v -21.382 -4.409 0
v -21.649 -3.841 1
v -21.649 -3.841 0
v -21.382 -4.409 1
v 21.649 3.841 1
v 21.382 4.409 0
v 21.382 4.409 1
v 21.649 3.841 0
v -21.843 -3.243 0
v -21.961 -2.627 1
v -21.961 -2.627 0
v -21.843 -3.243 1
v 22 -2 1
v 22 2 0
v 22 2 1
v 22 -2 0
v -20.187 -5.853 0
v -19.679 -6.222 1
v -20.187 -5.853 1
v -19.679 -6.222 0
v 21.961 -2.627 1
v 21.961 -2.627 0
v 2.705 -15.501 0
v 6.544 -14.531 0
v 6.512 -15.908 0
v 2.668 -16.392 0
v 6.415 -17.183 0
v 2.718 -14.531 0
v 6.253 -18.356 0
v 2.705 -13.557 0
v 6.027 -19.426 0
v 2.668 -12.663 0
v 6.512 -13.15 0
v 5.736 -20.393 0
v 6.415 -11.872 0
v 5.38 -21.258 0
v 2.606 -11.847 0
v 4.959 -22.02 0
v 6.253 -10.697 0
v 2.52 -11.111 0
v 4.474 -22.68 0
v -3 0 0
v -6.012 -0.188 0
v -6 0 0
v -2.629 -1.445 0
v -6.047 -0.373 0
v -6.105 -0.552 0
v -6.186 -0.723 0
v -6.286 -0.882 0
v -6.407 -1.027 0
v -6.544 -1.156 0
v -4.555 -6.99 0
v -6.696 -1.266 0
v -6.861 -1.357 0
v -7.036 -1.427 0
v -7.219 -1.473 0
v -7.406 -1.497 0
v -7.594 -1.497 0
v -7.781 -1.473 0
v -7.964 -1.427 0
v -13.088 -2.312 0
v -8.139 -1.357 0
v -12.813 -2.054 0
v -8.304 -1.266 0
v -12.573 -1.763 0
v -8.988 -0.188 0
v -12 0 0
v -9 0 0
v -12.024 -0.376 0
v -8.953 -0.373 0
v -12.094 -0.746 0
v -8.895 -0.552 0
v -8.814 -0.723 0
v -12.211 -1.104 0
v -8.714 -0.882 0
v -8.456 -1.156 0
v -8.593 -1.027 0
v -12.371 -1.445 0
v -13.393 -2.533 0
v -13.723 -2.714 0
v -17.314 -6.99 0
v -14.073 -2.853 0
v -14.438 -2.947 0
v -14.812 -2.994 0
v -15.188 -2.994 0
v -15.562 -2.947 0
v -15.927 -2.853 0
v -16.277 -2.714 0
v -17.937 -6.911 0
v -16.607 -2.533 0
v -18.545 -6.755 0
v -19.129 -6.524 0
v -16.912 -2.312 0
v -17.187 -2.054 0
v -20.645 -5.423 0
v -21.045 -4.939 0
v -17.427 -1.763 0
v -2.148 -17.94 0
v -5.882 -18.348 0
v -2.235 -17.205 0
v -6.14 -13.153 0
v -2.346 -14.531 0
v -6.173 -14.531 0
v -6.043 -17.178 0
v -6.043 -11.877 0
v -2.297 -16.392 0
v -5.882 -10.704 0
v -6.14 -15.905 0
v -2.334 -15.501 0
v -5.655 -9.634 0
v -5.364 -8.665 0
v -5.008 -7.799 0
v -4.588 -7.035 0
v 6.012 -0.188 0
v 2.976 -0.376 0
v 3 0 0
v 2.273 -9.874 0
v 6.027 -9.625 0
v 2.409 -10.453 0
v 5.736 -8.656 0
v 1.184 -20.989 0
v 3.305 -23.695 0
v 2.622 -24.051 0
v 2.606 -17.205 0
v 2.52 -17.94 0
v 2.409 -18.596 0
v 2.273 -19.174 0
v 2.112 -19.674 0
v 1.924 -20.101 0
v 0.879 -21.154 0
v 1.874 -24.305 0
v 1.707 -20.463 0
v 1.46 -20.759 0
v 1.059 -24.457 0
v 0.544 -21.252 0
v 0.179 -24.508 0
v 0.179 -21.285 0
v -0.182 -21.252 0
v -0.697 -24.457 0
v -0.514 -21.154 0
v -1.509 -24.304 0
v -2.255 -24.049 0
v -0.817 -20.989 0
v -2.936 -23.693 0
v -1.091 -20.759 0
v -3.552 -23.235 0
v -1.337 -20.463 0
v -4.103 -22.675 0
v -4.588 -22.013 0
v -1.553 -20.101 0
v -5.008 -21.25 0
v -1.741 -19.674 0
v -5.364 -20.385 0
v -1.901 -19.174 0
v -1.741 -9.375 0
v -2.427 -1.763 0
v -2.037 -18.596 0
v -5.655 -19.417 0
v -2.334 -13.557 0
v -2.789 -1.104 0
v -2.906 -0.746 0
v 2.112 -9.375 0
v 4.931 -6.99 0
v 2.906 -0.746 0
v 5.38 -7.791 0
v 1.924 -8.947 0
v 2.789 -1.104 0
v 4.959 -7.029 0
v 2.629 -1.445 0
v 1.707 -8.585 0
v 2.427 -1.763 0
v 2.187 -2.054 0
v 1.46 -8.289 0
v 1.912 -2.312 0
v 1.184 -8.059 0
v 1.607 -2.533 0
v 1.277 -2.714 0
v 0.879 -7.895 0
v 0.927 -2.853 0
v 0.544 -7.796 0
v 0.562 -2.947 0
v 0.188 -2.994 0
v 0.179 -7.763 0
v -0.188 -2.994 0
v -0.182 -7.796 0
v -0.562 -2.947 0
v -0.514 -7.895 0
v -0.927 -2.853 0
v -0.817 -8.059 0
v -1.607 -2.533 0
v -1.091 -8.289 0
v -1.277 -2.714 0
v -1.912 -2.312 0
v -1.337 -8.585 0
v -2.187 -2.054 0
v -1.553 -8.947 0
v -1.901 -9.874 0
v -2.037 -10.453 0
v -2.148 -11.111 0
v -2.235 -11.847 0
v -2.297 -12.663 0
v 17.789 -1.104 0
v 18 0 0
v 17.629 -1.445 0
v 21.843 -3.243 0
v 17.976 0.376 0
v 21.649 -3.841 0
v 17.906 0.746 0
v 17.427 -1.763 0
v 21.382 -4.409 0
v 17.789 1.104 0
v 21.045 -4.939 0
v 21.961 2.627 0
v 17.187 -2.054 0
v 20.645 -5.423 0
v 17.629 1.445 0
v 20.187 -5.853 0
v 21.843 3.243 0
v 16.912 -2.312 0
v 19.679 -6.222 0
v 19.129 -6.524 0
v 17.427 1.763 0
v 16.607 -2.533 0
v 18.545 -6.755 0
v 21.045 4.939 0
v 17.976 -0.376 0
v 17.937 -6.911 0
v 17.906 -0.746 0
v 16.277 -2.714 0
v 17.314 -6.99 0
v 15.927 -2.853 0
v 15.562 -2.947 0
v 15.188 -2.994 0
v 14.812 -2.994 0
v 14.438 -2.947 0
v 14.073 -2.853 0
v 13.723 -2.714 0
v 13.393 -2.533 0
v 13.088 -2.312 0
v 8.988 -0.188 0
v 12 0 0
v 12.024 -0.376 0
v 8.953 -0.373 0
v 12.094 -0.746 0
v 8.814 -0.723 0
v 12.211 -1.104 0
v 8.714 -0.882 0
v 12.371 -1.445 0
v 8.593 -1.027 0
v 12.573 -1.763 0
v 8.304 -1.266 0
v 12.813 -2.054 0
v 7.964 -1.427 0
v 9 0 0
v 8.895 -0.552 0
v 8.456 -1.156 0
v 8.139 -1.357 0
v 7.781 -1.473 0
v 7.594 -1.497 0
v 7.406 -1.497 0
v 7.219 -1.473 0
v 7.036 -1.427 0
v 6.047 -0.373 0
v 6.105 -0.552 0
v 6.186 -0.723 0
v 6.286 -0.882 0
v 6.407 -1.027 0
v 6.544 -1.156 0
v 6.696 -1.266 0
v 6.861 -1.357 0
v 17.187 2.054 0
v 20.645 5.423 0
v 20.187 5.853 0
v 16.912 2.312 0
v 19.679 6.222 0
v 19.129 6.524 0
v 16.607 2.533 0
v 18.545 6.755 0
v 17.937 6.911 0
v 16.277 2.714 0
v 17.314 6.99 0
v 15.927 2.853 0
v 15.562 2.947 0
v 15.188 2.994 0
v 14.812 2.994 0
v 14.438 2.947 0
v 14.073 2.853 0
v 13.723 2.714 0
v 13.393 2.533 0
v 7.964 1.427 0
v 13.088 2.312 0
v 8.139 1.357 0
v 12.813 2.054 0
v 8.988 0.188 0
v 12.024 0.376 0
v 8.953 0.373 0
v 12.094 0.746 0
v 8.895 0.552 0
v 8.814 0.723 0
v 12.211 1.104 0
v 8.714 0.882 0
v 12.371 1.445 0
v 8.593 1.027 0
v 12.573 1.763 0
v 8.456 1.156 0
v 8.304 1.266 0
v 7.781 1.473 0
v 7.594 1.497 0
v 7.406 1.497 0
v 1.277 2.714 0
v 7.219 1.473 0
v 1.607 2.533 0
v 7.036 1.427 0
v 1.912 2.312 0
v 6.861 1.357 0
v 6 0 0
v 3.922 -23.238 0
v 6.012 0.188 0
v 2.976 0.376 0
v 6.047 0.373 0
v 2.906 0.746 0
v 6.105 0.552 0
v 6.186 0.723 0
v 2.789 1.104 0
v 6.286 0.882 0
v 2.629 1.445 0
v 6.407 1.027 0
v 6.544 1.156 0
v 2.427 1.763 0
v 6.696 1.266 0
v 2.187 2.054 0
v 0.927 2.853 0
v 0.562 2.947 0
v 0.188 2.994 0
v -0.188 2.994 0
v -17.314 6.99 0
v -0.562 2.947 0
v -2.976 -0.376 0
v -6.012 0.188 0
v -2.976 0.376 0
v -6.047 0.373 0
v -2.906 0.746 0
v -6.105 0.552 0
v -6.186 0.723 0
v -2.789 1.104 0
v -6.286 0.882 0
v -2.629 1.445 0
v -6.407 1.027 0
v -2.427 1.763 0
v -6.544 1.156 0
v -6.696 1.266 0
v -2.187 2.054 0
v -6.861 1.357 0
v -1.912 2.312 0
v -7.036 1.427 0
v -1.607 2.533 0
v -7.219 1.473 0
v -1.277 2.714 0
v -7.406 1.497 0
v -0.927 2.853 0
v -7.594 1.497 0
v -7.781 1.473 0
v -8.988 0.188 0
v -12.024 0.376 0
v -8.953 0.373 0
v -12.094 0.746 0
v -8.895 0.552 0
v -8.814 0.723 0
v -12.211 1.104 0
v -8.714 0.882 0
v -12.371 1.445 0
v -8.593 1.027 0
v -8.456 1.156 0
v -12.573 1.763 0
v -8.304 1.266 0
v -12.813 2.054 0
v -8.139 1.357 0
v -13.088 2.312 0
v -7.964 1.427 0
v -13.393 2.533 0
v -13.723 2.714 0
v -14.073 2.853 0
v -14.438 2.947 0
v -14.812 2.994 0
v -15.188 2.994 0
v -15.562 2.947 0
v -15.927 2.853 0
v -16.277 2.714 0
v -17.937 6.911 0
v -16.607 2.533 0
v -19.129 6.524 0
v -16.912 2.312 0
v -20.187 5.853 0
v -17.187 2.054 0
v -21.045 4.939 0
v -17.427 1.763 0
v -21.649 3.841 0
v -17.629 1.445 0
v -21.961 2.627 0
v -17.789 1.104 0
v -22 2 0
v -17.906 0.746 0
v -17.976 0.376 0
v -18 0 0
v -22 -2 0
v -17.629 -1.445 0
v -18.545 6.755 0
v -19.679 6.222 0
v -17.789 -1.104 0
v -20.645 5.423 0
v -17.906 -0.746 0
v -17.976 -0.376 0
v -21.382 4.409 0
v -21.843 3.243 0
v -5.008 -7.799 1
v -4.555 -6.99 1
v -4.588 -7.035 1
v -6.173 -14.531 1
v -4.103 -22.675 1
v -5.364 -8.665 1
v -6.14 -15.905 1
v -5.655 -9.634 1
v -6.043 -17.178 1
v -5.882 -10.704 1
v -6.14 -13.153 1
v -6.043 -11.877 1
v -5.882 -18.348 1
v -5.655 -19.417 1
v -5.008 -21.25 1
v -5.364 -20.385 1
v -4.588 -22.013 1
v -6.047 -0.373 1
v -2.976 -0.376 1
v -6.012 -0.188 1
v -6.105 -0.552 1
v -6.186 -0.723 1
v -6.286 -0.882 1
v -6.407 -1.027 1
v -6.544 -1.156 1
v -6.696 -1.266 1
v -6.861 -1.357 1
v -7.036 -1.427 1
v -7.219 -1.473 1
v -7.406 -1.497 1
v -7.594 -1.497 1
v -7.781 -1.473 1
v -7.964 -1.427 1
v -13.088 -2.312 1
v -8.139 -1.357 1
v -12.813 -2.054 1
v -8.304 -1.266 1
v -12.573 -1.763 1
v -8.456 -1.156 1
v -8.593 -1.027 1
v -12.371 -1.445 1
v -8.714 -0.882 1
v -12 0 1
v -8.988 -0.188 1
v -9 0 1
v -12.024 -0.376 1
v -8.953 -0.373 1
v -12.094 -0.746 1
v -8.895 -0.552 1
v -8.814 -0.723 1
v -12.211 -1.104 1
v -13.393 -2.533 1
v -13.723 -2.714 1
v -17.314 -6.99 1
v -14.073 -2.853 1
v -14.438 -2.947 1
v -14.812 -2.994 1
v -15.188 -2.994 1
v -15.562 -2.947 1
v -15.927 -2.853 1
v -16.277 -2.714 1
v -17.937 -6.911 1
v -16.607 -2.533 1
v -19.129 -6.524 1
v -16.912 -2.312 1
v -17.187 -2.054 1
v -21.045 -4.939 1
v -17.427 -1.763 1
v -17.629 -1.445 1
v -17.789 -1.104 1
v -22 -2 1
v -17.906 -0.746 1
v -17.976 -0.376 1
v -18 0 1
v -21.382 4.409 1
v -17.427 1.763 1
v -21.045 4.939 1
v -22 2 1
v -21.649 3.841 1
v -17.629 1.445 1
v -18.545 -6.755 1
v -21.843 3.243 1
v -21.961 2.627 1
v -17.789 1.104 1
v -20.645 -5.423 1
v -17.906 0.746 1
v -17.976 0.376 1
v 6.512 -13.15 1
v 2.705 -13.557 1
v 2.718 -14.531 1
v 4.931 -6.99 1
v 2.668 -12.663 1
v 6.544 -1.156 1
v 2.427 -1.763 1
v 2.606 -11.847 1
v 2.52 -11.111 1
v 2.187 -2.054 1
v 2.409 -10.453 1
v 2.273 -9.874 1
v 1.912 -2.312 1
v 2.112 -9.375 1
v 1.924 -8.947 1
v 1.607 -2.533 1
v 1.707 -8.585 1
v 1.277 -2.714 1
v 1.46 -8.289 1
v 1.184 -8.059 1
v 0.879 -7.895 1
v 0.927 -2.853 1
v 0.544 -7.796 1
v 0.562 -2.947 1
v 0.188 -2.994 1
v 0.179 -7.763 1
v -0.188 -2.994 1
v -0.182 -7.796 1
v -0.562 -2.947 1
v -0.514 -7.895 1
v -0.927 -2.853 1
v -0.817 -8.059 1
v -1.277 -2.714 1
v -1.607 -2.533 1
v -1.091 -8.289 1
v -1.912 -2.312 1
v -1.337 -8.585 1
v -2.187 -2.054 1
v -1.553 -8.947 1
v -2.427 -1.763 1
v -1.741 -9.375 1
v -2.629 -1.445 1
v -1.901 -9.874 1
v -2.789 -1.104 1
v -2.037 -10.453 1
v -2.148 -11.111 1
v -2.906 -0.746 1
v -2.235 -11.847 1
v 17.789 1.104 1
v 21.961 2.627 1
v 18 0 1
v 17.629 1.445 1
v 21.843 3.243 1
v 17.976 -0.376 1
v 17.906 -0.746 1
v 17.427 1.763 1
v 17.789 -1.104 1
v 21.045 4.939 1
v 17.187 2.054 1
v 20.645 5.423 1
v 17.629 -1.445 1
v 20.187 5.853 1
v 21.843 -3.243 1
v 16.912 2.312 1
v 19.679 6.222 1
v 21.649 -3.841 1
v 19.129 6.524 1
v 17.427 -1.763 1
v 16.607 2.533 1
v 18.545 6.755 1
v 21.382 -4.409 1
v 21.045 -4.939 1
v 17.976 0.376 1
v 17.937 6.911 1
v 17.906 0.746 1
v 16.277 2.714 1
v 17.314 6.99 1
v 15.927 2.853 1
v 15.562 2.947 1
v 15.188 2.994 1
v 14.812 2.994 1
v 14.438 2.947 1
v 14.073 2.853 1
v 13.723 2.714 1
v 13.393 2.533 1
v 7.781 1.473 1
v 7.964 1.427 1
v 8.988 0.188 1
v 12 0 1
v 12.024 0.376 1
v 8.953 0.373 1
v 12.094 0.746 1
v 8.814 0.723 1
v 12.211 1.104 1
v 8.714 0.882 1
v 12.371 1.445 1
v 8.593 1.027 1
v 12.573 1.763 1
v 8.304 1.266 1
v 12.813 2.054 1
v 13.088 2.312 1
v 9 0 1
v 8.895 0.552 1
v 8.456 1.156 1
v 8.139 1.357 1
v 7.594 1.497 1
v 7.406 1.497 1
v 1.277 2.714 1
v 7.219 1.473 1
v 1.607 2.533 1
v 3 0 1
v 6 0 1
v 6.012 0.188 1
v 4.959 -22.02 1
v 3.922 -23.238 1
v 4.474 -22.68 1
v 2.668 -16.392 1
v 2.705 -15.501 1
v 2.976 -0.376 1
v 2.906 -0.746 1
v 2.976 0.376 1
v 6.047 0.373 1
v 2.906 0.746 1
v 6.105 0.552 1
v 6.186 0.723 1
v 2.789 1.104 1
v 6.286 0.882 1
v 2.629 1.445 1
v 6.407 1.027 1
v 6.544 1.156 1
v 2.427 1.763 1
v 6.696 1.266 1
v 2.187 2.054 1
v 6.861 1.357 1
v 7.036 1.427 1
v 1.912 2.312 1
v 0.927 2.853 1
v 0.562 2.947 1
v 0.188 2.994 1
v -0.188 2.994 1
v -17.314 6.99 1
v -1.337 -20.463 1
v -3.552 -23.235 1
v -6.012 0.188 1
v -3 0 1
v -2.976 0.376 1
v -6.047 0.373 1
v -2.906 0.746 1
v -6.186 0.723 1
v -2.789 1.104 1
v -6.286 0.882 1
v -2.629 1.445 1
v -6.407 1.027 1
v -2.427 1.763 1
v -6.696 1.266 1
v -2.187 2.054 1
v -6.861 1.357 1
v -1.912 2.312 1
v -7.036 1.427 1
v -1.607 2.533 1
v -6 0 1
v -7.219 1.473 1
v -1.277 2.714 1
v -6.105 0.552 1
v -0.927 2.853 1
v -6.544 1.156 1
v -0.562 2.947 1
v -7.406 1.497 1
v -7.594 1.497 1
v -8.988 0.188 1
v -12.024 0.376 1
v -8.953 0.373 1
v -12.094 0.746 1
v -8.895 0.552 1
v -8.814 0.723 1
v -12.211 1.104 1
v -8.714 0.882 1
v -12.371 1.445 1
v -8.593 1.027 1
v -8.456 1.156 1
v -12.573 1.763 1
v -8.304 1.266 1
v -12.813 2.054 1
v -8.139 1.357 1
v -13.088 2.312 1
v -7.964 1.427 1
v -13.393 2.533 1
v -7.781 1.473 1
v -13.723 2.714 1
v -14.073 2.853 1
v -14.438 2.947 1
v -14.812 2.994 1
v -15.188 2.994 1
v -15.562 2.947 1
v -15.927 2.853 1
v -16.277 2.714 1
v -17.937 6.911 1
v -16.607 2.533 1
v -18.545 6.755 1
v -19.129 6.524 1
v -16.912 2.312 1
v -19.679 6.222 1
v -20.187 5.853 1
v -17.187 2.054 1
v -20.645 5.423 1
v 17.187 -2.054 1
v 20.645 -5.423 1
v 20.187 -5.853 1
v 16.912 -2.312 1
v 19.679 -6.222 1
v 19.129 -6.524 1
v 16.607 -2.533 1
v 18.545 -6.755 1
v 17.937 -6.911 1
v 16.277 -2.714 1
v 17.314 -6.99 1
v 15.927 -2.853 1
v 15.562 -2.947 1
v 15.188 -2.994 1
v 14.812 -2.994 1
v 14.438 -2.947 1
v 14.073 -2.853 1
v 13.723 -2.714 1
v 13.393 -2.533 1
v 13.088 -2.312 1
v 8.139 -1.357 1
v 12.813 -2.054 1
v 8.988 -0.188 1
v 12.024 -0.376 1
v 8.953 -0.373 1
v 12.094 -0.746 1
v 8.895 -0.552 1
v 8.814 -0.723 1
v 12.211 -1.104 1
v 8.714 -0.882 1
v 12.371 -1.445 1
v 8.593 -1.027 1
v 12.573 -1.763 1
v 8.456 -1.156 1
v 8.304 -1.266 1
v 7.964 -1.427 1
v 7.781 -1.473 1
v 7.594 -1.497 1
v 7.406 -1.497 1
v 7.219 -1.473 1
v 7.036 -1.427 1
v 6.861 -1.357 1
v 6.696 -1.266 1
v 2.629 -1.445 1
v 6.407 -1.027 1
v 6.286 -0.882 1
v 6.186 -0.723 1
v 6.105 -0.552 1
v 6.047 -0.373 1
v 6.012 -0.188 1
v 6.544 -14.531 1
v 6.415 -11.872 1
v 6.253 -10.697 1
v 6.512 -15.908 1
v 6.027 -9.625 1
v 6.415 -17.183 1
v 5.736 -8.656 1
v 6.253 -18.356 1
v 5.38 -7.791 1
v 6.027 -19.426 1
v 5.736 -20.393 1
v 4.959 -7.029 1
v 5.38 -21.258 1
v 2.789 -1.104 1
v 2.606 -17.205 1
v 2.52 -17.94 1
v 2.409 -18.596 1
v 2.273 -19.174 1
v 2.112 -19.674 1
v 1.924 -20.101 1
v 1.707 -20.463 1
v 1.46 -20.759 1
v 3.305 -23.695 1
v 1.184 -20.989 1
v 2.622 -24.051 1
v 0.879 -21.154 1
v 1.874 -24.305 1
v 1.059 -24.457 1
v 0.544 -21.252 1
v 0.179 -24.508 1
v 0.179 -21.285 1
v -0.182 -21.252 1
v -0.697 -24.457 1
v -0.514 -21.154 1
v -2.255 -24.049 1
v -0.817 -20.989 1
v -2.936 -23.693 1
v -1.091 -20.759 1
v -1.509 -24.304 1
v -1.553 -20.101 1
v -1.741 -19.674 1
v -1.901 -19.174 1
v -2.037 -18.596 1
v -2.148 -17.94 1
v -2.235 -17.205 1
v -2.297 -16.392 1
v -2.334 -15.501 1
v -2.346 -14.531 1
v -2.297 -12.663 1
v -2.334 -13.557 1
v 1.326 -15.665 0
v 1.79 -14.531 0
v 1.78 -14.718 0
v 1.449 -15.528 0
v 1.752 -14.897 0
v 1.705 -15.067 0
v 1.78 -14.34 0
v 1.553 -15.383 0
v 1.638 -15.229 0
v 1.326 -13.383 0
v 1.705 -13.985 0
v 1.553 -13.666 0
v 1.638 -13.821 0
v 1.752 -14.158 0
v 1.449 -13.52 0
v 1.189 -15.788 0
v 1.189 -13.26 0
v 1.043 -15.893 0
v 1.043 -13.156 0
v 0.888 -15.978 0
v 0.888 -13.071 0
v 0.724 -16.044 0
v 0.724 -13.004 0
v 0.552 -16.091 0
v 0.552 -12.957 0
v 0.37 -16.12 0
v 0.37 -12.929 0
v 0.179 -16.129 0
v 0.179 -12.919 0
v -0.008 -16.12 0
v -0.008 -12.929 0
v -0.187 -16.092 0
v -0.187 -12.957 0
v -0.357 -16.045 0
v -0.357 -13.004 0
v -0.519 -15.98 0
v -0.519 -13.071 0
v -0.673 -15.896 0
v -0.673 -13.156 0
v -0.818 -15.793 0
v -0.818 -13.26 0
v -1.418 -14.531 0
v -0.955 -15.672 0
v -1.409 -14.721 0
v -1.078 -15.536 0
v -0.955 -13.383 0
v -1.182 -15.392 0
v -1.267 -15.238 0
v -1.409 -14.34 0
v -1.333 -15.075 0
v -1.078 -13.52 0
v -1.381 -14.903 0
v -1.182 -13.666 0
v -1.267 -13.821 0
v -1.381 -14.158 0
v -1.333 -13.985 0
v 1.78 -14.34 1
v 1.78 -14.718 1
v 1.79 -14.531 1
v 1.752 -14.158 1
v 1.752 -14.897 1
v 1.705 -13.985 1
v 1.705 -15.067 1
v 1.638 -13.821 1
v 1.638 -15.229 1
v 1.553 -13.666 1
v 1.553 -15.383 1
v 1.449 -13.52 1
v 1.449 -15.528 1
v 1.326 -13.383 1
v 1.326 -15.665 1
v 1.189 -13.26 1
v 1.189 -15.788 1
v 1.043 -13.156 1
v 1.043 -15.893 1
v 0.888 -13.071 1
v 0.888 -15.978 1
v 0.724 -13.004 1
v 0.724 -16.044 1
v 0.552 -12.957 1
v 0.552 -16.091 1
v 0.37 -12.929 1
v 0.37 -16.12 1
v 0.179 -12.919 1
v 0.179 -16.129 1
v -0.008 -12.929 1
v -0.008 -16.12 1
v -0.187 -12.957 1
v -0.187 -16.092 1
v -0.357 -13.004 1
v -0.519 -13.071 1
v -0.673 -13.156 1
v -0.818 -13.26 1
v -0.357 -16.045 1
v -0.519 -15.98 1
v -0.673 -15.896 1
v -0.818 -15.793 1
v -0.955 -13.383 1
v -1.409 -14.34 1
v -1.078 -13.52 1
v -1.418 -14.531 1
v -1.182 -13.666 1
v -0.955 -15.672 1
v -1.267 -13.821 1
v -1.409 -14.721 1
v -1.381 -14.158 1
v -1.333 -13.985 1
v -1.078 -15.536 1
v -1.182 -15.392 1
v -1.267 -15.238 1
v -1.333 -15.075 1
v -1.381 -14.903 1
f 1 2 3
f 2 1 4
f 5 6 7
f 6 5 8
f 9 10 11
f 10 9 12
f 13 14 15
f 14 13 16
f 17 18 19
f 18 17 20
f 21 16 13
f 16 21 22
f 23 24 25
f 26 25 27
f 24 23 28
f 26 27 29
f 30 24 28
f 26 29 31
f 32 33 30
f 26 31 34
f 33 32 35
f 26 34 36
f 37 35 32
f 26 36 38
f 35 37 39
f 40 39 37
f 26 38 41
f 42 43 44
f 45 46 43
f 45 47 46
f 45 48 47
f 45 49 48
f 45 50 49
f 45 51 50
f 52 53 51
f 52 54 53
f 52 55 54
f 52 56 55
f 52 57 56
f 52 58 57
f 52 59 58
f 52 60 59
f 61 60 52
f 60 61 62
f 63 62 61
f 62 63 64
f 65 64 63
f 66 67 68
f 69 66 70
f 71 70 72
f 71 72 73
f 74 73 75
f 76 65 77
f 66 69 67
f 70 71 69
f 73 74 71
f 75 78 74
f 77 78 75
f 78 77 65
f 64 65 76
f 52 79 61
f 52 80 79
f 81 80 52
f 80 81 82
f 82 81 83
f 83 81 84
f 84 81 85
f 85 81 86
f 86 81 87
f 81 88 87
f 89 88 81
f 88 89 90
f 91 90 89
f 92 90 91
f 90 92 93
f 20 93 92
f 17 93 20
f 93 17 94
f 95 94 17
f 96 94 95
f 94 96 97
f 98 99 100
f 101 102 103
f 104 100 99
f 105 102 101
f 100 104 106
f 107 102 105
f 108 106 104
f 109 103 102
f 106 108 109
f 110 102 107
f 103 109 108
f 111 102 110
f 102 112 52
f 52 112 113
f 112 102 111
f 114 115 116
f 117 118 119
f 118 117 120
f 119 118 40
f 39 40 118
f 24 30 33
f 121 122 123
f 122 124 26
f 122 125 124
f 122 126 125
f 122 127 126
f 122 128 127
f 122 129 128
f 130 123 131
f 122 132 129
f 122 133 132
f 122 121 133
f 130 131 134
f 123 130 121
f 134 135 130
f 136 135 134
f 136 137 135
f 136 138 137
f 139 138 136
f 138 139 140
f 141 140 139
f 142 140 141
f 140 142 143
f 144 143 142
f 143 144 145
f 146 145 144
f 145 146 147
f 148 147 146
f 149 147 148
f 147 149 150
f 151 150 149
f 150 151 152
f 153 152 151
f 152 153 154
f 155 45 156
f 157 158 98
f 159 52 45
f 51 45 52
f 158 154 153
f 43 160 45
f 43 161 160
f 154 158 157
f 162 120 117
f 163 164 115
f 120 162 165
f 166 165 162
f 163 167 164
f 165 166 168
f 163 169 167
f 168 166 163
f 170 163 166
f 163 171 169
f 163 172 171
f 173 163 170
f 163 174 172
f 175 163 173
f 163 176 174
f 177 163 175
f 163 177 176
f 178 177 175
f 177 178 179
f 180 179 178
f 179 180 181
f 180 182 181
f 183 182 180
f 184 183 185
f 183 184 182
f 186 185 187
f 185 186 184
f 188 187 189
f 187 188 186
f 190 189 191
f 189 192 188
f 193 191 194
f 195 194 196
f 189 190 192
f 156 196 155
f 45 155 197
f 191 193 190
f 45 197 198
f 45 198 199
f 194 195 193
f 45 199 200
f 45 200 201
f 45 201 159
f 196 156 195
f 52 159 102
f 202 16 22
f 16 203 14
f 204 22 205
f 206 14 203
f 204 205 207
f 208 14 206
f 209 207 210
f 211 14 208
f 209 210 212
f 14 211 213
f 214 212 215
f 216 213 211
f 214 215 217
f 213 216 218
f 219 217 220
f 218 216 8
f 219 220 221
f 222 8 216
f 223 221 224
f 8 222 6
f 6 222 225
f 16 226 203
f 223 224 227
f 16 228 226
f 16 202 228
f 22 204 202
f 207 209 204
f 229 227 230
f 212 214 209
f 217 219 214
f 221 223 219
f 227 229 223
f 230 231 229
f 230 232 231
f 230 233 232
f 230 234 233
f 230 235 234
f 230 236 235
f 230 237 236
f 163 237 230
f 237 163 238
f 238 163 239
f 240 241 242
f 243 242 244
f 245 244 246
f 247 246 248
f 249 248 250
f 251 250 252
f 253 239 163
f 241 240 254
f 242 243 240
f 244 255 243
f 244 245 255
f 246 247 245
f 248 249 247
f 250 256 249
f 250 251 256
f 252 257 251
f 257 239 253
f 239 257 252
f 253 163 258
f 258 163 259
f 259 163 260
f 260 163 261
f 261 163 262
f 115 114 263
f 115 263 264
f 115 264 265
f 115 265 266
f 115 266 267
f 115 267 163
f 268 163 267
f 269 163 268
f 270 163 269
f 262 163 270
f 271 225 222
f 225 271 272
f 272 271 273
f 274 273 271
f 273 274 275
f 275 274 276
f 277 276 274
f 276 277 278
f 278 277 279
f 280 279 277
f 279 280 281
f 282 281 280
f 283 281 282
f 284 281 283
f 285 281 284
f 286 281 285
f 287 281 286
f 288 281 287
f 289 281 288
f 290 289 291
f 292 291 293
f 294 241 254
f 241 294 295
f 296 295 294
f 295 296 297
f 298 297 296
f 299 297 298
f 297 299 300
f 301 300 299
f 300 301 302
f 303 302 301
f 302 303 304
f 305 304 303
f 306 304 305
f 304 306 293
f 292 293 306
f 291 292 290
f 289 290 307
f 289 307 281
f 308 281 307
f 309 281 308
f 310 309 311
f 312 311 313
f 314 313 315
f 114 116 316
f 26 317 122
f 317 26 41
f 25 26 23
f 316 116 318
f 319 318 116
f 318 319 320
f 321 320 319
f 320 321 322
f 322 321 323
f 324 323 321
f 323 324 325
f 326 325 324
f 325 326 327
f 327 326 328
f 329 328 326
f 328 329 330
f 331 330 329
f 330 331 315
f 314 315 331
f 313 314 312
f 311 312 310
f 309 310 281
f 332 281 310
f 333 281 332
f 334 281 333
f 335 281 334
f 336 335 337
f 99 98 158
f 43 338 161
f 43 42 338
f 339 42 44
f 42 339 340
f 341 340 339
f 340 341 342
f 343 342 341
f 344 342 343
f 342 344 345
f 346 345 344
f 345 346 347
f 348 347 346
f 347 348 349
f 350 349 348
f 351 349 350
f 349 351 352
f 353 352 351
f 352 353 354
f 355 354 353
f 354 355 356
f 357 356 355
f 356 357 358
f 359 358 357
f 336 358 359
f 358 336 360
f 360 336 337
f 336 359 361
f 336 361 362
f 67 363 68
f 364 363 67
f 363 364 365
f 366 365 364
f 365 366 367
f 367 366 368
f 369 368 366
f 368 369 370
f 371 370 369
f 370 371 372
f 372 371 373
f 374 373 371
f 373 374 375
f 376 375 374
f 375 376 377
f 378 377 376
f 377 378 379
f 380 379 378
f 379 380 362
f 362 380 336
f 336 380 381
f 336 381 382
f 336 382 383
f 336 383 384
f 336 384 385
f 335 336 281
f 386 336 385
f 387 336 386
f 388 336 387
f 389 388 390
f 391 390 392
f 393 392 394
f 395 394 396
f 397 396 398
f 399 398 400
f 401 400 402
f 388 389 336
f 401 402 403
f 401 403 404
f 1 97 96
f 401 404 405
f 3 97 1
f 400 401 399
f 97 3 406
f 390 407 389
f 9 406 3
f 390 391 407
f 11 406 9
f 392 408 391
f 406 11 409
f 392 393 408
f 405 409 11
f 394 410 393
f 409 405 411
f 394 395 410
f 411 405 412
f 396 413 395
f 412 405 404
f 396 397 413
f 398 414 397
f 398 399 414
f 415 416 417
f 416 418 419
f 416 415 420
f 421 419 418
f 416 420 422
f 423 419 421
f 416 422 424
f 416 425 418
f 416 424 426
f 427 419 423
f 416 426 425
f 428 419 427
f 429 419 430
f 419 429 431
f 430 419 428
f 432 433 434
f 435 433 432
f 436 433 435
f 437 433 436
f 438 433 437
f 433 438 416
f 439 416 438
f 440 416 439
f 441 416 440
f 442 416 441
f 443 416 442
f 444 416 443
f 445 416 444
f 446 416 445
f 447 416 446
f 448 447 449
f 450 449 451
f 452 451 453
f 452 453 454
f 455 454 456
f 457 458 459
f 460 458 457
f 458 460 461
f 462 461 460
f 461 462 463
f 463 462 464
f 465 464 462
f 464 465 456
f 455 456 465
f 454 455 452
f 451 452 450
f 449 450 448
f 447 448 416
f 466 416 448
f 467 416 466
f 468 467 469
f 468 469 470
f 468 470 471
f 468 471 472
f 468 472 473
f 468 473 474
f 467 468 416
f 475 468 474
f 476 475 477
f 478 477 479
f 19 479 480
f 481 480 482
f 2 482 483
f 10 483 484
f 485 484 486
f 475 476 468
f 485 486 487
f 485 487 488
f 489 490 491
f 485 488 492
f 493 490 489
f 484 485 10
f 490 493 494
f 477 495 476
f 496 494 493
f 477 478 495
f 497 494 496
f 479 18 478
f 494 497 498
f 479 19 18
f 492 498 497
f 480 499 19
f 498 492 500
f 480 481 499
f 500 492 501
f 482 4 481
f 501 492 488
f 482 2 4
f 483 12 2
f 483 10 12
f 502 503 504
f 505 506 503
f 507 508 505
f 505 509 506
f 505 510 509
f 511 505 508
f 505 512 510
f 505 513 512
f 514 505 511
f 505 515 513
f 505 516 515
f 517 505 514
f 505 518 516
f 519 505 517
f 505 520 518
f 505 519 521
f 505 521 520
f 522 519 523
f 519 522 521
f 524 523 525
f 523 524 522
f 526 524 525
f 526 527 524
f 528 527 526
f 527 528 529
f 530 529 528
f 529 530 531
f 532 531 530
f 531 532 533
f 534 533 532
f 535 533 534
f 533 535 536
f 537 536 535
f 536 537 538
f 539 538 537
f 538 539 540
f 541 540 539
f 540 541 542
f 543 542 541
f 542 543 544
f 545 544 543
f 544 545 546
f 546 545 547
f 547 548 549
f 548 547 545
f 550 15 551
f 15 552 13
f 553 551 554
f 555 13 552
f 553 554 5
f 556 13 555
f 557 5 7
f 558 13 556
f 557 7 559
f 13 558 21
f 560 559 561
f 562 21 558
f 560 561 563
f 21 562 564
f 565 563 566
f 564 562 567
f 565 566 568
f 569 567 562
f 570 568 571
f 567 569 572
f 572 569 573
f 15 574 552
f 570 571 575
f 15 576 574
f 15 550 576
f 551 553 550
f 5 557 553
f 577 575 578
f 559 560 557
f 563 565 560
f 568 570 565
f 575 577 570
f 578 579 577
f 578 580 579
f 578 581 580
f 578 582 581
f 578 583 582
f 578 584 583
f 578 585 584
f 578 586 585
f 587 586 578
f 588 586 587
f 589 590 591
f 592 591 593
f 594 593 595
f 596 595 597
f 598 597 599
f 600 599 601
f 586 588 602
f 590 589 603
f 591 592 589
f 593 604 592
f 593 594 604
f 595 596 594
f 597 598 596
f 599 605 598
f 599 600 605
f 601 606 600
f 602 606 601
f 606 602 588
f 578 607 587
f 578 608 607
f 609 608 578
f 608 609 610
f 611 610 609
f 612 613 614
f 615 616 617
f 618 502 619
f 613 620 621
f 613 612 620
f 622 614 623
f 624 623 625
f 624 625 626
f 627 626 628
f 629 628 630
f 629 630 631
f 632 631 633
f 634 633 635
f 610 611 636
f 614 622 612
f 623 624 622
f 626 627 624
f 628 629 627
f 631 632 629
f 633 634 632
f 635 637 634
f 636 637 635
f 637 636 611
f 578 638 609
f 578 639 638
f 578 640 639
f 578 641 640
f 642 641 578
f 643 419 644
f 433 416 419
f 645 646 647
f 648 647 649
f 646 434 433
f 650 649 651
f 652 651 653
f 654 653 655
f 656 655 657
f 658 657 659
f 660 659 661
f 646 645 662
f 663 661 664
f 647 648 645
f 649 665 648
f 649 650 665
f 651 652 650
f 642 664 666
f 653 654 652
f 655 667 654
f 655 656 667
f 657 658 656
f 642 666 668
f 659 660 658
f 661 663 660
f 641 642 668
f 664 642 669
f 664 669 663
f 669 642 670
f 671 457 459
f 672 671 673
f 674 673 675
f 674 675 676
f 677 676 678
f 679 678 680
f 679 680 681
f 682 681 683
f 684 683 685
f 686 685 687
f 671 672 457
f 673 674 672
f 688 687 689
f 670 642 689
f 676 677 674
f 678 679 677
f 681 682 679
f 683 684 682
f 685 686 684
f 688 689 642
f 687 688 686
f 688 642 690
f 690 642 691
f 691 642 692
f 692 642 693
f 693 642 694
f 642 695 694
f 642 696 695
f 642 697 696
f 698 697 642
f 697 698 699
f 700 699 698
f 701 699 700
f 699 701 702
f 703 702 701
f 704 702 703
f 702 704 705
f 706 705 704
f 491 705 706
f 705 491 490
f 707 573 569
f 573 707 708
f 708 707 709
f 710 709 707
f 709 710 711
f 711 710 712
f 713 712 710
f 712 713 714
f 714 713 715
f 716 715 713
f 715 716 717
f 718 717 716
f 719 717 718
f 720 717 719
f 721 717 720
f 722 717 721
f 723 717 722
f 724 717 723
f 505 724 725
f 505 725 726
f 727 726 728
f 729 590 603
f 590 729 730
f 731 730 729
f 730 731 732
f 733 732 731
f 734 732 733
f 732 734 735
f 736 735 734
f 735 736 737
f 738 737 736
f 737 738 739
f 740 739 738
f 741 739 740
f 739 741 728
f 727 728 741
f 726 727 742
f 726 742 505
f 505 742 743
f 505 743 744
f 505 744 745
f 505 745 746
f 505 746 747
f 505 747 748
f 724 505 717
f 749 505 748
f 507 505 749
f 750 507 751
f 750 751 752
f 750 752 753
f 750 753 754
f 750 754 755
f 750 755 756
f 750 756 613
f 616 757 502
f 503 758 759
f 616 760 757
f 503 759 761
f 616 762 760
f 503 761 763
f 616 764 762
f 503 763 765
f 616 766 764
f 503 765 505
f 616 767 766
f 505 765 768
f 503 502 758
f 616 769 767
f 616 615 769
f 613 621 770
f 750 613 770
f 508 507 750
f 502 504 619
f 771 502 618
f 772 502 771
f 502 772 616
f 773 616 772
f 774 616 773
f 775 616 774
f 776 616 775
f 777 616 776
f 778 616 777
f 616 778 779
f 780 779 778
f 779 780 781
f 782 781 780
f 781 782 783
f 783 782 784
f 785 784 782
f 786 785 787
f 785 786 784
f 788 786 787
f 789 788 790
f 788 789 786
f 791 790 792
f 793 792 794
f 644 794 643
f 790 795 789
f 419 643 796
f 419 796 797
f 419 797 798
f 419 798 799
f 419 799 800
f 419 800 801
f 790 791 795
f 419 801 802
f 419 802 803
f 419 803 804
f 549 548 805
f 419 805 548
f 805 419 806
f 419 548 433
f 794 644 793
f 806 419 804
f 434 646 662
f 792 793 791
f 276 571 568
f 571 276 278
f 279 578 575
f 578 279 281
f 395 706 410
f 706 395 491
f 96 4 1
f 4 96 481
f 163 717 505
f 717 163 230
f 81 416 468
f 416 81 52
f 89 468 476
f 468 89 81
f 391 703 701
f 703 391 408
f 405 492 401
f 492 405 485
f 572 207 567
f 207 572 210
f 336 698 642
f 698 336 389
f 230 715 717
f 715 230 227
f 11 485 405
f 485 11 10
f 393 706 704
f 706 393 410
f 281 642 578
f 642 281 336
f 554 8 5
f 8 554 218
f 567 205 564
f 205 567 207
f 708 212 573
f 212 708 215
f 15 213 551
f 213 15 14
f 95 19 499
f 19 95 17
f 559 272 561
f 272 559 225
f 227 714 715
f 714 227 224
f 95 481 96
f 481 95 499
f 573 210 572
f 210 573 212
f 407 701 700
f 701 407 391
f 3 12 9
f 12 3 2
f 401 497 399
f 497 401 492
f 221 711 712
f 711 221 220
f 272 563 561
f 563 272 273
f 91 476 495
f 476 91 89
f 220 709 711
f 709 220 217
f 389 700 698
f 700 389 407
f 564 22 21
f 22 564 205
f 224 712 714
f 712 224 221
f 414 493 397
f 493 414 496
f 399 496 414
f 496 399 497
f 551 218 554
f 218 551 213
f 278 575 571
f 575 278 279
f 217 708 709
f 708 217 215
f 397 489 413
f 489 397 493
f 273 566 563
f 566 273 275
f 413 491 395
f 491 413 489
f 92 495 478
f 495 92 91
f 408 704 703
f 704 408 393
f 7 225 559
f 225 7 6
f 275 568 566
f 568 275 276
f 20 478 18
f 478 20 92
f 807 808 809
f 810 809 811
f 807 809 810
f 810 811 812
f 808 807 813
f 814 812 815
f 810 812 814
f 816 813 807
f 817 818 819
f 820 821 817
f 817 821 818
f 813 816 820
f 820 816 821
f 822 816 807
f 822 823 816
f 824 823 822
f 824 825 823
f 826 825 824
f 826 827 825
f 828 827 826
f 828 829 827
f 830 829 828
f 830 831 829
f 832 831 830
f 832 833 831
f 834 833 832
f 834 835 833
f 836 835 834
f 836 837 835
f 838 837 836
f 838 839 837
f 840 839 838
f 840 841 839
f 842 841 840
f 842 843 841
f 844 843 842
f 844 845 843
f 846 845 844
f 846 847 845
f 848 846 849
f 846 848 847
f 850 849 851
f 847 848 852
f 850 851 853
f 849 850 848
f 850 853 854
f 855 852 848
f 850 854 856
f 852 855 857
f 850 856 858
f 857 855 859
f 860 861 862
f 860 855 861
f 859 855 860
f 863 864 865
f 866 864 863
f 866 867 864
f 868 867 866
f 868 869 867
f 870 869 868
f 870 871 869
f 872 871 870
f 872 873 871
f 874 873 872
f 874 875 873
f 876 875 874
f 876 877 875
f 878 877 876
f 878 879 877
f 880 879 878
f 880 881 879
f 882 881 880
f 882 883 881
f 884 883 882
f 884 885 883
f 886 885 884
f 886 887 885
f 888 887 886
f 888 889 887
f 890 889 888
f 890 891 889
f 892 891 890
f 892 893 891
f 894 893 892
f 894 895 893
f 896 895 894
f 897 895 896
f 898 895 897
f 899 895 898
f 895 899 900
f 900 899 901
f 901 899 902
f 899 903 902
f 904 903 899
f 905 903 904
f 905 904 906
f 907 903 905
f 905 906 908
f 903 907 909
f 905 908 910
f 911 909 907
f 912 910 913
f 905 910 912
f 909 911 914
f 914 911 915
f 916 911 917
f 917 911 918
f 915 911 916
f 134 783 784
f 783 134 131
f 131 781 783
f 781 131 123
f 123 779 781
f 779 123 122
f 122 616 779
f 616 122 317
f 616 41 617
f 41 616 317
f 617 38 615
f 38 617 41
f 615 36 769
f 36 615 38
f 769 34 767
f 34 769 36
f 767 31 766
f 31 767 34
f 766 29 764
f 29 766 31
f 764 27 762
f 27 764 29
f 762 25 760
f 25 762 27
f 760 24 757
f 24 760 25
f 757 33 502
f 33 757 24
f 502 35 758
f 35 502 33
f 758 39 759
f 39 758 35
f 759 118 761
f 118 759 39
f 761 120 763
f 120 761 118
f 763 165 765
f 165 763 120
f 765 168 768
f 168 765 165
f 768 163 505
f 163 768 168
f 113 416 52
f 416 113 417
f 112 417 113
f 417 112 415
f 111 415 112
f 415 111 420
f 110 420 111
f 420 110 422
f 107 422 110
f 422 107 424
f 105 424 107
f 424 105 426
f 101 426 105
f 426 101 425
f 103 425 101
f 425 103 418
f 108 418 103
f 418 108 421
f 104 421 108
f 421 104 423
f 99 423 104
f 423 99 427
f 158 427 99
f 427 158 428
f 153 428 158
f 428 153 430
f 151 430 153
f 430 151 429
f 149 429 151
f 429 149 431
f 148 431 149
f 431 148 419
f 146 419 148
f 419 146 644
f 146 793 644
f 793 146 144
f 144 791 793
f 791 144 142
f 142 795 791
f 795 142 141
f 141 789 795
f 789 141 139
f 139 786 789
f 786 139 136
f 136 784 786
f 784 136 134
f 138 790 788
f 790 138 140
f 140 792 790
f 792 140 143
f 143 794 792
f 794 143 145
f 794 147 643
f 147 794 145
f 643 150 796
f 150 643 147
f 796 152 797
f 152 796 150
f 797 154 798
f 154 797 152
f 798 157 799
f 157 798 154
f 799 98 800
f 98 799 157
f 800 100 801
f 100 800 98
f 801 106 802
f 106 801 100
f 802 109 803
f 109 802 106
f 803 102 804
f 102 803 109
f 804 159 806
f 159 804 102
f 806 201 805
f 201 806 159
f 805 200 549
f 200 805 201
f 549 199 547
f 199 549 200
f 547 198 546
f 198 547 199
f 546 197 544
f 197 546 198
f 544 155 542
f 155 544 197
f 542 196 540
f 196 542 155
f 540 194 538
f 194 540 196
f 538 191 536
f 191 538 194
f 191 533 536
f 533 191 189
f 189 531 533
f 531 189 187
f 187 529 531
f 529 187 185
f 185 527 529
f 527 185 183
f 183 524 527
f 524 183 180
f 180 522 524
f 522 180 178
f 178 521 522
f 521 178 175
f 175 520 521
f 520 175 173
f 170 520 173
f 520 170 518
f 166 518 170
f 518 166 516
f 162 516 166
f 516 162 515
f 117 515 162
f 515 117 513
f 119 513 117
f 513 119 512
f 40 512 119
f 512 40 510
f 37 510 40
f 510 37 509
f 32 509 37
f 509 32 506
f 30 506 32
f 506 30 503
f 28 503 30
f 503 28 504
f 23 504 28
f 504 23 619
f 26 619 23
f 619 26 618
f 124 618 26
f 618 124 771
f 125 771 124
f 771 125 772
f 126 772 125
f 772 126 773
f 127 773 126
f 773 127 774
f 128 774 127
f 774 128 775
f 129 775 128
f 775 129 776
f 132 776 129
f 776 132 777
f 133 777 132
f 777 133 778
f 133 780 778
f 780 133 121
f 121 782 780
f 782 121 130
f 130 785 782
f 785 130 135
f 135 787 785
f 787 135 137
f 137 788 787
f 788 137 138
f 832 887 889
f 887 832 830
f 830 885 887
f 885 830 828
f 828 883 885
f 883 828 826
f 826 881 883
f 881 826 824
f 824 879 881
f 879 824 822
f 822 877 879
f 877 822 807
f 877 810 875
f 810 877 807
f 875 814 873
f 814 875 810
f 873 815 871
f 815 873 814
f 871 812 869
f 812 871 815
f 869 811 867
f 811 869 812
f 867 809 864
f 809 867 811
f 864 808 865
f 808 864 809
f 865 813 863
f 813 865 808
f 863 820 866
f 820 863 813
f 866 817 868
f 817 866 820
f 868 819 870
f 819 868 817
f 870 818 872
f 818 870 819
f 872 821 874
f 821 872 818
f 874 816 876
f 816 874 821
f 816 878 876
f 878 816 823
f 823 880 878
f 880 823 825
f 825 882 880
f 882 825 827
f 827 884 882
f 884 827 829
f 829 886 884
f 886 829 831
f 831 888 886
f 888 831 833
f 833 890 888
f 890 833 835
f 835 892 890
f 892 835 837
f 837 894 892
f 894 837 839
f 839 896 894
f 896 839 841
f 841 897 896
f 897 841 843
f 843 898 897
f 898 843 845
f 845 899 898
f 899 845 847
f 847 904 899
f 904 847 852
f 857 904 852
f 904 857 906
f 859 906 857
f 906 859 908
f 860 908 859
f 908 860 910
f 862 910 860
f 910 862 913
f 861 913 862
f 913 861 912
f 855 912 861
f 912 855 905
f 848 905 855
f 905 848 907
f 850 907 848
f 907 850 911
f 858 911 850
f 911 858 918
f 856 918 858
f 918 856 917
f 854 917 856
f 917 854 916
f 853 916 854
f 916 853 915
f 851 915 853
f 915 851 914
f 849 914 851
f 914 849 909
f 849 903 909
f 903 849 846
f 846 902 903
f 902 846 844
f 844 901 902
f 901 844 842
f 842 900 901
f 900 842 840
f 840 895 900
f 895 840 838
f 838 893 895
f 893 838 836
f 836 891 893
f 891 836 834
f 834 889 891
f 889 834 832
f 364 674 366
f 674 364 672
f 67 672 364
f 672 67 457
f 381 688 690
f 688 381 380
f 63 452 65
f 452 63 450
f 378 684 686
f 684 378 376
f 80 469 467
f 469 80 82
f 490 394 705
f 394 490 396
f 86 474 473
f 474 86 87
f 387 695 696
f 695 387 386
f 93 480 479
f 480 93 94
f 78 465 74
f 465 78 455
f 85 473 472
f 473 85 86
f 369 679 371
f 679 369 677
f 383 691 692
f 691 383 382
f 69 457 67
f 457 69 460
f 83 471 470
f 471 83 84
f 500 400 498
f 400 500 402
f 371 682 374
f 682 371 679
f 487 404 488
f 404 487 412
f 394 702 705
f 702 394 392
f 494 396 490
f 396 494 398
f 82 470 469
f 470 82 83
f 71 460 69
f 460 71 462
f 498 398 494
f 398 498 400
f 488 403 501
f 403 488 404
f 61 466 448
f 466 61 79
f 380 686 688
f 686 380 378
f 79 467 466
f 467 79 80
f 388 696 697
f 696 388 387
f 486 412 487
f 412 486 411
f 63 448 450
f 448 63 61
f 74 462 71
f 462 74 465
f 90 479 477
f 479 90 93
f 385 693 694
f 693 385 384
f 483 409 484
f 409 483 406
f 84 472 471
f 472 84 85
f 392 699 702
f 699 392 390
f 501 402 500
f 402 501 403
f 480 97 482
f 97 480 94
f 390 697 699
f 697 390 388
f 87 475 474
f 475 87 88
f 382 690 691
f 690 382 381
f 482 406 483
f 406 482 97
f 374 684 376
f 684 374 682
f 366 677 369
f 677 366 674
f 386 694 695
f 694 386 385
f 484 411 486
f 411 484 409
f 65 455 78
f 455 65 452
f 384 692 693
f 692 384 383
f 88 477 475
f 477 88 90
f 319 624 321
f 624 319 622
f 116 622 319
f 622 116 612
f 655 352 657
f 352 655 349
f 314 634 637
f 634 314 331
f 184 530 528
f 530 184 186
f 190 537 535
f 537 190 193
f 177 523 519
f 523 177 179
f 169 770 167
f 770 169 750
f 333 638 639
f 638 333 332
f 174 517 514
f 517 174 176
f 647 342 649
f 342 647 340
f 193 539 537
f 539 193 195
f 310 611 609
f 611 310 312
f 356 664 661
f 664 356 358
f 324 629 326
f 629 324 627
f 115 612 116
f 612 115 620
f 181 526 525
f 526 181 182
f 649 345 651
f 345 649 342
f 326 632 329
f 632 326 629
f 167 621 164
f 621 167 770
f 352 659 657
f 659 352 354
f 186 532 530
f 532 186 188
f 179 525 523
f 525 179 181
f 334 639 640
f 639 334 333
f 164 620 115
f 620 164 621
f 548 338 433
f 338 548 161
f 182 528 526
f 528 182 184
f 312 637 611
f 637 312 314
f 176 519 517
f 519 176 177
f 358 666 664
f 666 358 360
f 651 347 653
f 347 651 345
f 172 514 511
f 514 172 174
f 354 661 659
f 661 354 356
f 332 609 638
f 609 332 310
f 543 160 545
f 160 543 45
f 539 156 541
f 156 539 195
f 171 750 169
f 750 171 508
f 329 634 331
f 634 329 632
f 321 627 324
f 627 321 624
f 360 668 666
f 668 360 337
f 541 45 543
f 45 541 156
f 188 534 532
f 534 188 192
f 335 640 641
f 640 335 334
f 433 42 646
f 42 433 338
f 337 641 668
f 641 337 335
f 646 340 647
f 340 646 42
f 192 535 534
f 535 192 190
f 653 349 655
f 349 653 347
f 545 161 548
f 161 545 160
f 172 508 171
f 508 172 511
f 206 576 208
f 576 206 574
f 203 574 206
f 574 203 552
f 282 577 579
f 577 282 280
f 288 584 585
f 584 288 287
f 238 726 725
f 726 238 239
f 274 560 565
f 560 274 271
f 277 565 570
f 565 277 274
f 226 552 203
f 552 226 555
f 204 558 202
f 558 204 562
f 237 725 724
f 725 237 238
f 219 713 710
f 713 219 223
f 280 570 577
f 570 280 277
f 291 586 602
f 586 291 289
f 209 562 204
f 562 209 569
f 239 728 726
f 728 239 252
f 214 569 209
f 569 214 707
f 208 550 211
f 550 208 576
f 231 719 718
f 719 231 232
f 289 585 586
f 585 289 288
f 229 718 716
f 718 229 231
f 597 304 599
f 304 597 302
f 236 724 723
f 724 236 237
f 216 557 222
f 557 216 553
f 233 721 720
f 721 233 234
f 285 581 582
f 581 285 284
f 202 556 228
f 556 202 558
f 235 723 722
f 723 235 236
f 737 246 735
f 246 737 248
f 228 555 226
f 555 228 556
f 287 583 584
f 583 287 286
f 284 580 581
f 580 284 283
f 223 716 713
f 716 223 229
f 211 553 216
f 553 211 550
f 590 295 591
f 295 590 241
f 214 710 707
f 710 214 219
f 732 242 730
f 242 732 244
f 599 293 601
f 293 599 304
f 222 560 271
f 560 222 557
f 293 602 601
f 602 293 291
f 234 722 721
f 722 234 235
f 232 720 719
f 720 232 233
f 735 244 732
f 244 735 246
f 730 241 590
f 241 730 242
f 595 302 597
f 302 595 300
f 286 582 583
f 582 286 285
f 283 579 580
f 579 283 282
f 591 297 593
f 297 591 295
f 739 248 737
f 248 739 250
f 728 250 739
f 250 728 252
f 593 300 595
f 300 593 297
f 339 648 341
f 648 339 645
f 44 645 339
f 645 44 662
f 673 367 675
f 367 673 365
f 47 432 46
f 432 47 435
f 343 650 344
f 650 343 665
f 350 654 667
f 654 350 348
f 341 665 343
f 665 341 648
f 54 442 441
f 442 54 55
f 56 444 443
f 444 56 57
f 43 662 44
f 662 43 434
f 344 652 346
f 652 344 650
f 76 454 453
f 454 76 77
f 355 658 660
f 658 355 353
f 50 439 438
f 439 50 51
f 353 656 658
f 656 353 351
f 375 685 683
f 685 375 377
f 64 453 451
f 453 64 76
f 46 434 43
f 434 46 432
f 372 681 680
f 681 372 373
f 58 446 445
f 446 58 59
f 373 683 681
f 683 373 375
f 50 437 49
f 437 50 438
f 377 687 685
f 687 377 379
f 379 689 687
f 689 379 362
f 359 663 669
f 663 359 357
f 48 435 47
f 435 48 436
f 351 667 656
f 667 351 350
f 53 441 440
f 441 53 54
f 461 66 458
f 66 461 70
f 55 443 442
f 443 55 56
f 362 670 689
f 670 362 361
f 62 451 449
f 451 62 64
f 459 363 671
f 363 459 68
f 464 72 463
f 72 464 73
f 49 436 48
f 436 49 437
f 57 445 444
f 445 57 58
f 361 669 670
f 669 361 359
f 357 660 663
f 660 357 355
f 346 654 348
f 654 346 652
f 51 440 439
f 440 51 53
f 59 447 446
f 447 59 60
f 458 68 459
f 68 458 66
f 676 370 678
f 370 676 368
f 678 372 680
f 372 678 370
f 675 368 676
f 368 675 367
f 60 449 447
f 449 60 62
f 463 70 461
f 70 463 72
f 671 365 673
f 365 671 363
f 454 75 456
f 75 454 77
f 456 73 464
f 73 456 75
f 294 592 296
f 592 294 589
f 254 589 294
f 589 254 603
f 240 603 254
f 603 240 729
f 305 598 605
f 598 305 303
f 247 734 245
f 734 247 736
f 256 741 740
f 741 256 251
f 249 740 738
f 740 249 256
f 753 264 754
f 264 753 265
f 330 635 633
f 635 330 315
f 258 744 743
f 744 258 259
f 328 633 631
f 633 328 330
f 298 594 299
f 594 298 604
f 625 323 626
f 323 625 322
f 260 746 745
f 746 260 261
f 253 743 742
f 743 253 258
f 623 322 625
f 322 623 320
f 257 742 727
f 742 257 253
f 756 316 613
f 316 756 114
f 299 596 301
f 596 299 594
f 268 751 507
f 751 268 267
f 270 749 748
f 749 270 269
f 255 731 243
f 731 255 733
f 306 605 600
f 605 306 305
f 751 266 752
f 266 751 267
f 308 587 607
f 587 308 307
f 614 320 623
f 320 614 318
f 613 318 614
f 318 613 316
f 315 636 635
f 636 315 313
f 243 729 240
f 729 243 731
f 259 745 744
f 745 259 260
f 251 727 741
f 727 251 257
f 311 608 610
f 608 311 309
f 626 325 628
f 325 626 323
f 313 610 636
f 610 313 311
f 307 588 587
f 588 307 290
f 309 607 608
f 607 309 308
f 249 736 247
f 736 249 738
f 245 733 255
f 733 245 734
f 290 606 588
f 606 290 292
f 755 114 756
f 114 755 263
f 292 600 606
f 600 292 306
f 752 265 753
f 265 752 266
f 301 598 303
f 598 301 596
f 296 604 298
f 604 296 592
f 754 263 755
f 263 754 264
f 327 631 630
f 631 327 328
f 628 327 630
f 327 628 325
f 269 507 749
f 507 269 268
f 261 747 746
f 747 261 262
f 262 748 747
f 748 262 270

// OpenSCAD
$fn = 50;


difference() {
	union() {
		*color(alpha = 1.0000000000, c = "gray") {
			translate(v = [0, 14, 0]) {
				linear_extrude(height = 1) {
					text(font = "Arial:style=Bold", halign = "center", size = 4.5000000000, text = "COMMENT description oobb_plate_shape_p_type_1_depth_3_width_1_thickness_0_extra_oobb_size", valign = "center");
				}
			}
		}
		hull() {
			translate(v = [-17.0000000000, 2.0000000000, 0]) {
				cylinder(h = 1, r = 5);
			}
			translate(v = [17.0000000000, 2.0000000000, 0]) {
				cylinder(h = 1, r = 5);
			}
			translate(v = [-17.0000000000, -2.0000000000, 0]) {
				cylinder(h = 1, r = 5);
			}
			translate(v = [17.0000000000, -2.0000000000, 0]) {
				cylinder(h = 1, r = 5);
			}
		}
		translate(v = [0, -5, 0]) {
			linear_extrude(height = 1) {
				text(font = "DejaVu Sans Mono:style=Bold", halign = "center", size = 19.0000000000, text = "0", valign = "top");
			}
		}
	}
	union() {
		*color(alpha = 1.0000000000, c = "gray") {
			translate(v = [0, 14, 0]) {
				linear_extrude(height = 1) {
					text(font = "Arial:style=Bold", halign = "center", size = 4.5000000000, text = "COMMENT description oobb_holes_shape_n_type_3_width_1_thickness_0_extra_oobb_size_1_height_'all'_holes_true_both_holes", valign = "center");
				}
			}
		}
		translate(v = [-15.0000000000, 0.0000000000, 0]) {
			translate(v = [0, 0, -50]) {
				cylinder(h = 100, r = 3.0000000000);
			}
		}
		translate(v = [0, 0, -50]) {
			cylinder(h = 100, r = 3.0000000000);
		}
		translate(v = [15.0000000000, 0.0000000000, 0]) {
			translate(v = [0, 0, -50]) {
				cylinder(h = 100, r = 3.0000000000);
			}
		}
		translate(v = [-15.0000000000, 0.0000000000, 0]) {
			translate(v = [0, 0, -50]) {
				cylinder(h = 100, r = 1.5000000000);
			}
		}
		translate(v = [-7.5000000000, 0.0000000000, 0]) {
			translate(v = [0, 0, -50]) {
				cylinder(h = 100, r = 1.5000000000);
			}
		}
		translate(v = [0, 0, -50]) {
			cylinder(h = 100, r = 1.5000000000);
		}
		translate(v = [7.5000000000, 0.0000000000, 0]) {
			translate(v = [0, 0, -50]) {
				cylinder(h = 100, r = 1.5000000000);
			}
		}
		translate(v = [15.0000000000, 0.0000000000, 0]) {
			translate(v = [0, 0, -50]) {
				cylinder(h = 100, r = 1.5000000000);
			}
		}
	}
}
